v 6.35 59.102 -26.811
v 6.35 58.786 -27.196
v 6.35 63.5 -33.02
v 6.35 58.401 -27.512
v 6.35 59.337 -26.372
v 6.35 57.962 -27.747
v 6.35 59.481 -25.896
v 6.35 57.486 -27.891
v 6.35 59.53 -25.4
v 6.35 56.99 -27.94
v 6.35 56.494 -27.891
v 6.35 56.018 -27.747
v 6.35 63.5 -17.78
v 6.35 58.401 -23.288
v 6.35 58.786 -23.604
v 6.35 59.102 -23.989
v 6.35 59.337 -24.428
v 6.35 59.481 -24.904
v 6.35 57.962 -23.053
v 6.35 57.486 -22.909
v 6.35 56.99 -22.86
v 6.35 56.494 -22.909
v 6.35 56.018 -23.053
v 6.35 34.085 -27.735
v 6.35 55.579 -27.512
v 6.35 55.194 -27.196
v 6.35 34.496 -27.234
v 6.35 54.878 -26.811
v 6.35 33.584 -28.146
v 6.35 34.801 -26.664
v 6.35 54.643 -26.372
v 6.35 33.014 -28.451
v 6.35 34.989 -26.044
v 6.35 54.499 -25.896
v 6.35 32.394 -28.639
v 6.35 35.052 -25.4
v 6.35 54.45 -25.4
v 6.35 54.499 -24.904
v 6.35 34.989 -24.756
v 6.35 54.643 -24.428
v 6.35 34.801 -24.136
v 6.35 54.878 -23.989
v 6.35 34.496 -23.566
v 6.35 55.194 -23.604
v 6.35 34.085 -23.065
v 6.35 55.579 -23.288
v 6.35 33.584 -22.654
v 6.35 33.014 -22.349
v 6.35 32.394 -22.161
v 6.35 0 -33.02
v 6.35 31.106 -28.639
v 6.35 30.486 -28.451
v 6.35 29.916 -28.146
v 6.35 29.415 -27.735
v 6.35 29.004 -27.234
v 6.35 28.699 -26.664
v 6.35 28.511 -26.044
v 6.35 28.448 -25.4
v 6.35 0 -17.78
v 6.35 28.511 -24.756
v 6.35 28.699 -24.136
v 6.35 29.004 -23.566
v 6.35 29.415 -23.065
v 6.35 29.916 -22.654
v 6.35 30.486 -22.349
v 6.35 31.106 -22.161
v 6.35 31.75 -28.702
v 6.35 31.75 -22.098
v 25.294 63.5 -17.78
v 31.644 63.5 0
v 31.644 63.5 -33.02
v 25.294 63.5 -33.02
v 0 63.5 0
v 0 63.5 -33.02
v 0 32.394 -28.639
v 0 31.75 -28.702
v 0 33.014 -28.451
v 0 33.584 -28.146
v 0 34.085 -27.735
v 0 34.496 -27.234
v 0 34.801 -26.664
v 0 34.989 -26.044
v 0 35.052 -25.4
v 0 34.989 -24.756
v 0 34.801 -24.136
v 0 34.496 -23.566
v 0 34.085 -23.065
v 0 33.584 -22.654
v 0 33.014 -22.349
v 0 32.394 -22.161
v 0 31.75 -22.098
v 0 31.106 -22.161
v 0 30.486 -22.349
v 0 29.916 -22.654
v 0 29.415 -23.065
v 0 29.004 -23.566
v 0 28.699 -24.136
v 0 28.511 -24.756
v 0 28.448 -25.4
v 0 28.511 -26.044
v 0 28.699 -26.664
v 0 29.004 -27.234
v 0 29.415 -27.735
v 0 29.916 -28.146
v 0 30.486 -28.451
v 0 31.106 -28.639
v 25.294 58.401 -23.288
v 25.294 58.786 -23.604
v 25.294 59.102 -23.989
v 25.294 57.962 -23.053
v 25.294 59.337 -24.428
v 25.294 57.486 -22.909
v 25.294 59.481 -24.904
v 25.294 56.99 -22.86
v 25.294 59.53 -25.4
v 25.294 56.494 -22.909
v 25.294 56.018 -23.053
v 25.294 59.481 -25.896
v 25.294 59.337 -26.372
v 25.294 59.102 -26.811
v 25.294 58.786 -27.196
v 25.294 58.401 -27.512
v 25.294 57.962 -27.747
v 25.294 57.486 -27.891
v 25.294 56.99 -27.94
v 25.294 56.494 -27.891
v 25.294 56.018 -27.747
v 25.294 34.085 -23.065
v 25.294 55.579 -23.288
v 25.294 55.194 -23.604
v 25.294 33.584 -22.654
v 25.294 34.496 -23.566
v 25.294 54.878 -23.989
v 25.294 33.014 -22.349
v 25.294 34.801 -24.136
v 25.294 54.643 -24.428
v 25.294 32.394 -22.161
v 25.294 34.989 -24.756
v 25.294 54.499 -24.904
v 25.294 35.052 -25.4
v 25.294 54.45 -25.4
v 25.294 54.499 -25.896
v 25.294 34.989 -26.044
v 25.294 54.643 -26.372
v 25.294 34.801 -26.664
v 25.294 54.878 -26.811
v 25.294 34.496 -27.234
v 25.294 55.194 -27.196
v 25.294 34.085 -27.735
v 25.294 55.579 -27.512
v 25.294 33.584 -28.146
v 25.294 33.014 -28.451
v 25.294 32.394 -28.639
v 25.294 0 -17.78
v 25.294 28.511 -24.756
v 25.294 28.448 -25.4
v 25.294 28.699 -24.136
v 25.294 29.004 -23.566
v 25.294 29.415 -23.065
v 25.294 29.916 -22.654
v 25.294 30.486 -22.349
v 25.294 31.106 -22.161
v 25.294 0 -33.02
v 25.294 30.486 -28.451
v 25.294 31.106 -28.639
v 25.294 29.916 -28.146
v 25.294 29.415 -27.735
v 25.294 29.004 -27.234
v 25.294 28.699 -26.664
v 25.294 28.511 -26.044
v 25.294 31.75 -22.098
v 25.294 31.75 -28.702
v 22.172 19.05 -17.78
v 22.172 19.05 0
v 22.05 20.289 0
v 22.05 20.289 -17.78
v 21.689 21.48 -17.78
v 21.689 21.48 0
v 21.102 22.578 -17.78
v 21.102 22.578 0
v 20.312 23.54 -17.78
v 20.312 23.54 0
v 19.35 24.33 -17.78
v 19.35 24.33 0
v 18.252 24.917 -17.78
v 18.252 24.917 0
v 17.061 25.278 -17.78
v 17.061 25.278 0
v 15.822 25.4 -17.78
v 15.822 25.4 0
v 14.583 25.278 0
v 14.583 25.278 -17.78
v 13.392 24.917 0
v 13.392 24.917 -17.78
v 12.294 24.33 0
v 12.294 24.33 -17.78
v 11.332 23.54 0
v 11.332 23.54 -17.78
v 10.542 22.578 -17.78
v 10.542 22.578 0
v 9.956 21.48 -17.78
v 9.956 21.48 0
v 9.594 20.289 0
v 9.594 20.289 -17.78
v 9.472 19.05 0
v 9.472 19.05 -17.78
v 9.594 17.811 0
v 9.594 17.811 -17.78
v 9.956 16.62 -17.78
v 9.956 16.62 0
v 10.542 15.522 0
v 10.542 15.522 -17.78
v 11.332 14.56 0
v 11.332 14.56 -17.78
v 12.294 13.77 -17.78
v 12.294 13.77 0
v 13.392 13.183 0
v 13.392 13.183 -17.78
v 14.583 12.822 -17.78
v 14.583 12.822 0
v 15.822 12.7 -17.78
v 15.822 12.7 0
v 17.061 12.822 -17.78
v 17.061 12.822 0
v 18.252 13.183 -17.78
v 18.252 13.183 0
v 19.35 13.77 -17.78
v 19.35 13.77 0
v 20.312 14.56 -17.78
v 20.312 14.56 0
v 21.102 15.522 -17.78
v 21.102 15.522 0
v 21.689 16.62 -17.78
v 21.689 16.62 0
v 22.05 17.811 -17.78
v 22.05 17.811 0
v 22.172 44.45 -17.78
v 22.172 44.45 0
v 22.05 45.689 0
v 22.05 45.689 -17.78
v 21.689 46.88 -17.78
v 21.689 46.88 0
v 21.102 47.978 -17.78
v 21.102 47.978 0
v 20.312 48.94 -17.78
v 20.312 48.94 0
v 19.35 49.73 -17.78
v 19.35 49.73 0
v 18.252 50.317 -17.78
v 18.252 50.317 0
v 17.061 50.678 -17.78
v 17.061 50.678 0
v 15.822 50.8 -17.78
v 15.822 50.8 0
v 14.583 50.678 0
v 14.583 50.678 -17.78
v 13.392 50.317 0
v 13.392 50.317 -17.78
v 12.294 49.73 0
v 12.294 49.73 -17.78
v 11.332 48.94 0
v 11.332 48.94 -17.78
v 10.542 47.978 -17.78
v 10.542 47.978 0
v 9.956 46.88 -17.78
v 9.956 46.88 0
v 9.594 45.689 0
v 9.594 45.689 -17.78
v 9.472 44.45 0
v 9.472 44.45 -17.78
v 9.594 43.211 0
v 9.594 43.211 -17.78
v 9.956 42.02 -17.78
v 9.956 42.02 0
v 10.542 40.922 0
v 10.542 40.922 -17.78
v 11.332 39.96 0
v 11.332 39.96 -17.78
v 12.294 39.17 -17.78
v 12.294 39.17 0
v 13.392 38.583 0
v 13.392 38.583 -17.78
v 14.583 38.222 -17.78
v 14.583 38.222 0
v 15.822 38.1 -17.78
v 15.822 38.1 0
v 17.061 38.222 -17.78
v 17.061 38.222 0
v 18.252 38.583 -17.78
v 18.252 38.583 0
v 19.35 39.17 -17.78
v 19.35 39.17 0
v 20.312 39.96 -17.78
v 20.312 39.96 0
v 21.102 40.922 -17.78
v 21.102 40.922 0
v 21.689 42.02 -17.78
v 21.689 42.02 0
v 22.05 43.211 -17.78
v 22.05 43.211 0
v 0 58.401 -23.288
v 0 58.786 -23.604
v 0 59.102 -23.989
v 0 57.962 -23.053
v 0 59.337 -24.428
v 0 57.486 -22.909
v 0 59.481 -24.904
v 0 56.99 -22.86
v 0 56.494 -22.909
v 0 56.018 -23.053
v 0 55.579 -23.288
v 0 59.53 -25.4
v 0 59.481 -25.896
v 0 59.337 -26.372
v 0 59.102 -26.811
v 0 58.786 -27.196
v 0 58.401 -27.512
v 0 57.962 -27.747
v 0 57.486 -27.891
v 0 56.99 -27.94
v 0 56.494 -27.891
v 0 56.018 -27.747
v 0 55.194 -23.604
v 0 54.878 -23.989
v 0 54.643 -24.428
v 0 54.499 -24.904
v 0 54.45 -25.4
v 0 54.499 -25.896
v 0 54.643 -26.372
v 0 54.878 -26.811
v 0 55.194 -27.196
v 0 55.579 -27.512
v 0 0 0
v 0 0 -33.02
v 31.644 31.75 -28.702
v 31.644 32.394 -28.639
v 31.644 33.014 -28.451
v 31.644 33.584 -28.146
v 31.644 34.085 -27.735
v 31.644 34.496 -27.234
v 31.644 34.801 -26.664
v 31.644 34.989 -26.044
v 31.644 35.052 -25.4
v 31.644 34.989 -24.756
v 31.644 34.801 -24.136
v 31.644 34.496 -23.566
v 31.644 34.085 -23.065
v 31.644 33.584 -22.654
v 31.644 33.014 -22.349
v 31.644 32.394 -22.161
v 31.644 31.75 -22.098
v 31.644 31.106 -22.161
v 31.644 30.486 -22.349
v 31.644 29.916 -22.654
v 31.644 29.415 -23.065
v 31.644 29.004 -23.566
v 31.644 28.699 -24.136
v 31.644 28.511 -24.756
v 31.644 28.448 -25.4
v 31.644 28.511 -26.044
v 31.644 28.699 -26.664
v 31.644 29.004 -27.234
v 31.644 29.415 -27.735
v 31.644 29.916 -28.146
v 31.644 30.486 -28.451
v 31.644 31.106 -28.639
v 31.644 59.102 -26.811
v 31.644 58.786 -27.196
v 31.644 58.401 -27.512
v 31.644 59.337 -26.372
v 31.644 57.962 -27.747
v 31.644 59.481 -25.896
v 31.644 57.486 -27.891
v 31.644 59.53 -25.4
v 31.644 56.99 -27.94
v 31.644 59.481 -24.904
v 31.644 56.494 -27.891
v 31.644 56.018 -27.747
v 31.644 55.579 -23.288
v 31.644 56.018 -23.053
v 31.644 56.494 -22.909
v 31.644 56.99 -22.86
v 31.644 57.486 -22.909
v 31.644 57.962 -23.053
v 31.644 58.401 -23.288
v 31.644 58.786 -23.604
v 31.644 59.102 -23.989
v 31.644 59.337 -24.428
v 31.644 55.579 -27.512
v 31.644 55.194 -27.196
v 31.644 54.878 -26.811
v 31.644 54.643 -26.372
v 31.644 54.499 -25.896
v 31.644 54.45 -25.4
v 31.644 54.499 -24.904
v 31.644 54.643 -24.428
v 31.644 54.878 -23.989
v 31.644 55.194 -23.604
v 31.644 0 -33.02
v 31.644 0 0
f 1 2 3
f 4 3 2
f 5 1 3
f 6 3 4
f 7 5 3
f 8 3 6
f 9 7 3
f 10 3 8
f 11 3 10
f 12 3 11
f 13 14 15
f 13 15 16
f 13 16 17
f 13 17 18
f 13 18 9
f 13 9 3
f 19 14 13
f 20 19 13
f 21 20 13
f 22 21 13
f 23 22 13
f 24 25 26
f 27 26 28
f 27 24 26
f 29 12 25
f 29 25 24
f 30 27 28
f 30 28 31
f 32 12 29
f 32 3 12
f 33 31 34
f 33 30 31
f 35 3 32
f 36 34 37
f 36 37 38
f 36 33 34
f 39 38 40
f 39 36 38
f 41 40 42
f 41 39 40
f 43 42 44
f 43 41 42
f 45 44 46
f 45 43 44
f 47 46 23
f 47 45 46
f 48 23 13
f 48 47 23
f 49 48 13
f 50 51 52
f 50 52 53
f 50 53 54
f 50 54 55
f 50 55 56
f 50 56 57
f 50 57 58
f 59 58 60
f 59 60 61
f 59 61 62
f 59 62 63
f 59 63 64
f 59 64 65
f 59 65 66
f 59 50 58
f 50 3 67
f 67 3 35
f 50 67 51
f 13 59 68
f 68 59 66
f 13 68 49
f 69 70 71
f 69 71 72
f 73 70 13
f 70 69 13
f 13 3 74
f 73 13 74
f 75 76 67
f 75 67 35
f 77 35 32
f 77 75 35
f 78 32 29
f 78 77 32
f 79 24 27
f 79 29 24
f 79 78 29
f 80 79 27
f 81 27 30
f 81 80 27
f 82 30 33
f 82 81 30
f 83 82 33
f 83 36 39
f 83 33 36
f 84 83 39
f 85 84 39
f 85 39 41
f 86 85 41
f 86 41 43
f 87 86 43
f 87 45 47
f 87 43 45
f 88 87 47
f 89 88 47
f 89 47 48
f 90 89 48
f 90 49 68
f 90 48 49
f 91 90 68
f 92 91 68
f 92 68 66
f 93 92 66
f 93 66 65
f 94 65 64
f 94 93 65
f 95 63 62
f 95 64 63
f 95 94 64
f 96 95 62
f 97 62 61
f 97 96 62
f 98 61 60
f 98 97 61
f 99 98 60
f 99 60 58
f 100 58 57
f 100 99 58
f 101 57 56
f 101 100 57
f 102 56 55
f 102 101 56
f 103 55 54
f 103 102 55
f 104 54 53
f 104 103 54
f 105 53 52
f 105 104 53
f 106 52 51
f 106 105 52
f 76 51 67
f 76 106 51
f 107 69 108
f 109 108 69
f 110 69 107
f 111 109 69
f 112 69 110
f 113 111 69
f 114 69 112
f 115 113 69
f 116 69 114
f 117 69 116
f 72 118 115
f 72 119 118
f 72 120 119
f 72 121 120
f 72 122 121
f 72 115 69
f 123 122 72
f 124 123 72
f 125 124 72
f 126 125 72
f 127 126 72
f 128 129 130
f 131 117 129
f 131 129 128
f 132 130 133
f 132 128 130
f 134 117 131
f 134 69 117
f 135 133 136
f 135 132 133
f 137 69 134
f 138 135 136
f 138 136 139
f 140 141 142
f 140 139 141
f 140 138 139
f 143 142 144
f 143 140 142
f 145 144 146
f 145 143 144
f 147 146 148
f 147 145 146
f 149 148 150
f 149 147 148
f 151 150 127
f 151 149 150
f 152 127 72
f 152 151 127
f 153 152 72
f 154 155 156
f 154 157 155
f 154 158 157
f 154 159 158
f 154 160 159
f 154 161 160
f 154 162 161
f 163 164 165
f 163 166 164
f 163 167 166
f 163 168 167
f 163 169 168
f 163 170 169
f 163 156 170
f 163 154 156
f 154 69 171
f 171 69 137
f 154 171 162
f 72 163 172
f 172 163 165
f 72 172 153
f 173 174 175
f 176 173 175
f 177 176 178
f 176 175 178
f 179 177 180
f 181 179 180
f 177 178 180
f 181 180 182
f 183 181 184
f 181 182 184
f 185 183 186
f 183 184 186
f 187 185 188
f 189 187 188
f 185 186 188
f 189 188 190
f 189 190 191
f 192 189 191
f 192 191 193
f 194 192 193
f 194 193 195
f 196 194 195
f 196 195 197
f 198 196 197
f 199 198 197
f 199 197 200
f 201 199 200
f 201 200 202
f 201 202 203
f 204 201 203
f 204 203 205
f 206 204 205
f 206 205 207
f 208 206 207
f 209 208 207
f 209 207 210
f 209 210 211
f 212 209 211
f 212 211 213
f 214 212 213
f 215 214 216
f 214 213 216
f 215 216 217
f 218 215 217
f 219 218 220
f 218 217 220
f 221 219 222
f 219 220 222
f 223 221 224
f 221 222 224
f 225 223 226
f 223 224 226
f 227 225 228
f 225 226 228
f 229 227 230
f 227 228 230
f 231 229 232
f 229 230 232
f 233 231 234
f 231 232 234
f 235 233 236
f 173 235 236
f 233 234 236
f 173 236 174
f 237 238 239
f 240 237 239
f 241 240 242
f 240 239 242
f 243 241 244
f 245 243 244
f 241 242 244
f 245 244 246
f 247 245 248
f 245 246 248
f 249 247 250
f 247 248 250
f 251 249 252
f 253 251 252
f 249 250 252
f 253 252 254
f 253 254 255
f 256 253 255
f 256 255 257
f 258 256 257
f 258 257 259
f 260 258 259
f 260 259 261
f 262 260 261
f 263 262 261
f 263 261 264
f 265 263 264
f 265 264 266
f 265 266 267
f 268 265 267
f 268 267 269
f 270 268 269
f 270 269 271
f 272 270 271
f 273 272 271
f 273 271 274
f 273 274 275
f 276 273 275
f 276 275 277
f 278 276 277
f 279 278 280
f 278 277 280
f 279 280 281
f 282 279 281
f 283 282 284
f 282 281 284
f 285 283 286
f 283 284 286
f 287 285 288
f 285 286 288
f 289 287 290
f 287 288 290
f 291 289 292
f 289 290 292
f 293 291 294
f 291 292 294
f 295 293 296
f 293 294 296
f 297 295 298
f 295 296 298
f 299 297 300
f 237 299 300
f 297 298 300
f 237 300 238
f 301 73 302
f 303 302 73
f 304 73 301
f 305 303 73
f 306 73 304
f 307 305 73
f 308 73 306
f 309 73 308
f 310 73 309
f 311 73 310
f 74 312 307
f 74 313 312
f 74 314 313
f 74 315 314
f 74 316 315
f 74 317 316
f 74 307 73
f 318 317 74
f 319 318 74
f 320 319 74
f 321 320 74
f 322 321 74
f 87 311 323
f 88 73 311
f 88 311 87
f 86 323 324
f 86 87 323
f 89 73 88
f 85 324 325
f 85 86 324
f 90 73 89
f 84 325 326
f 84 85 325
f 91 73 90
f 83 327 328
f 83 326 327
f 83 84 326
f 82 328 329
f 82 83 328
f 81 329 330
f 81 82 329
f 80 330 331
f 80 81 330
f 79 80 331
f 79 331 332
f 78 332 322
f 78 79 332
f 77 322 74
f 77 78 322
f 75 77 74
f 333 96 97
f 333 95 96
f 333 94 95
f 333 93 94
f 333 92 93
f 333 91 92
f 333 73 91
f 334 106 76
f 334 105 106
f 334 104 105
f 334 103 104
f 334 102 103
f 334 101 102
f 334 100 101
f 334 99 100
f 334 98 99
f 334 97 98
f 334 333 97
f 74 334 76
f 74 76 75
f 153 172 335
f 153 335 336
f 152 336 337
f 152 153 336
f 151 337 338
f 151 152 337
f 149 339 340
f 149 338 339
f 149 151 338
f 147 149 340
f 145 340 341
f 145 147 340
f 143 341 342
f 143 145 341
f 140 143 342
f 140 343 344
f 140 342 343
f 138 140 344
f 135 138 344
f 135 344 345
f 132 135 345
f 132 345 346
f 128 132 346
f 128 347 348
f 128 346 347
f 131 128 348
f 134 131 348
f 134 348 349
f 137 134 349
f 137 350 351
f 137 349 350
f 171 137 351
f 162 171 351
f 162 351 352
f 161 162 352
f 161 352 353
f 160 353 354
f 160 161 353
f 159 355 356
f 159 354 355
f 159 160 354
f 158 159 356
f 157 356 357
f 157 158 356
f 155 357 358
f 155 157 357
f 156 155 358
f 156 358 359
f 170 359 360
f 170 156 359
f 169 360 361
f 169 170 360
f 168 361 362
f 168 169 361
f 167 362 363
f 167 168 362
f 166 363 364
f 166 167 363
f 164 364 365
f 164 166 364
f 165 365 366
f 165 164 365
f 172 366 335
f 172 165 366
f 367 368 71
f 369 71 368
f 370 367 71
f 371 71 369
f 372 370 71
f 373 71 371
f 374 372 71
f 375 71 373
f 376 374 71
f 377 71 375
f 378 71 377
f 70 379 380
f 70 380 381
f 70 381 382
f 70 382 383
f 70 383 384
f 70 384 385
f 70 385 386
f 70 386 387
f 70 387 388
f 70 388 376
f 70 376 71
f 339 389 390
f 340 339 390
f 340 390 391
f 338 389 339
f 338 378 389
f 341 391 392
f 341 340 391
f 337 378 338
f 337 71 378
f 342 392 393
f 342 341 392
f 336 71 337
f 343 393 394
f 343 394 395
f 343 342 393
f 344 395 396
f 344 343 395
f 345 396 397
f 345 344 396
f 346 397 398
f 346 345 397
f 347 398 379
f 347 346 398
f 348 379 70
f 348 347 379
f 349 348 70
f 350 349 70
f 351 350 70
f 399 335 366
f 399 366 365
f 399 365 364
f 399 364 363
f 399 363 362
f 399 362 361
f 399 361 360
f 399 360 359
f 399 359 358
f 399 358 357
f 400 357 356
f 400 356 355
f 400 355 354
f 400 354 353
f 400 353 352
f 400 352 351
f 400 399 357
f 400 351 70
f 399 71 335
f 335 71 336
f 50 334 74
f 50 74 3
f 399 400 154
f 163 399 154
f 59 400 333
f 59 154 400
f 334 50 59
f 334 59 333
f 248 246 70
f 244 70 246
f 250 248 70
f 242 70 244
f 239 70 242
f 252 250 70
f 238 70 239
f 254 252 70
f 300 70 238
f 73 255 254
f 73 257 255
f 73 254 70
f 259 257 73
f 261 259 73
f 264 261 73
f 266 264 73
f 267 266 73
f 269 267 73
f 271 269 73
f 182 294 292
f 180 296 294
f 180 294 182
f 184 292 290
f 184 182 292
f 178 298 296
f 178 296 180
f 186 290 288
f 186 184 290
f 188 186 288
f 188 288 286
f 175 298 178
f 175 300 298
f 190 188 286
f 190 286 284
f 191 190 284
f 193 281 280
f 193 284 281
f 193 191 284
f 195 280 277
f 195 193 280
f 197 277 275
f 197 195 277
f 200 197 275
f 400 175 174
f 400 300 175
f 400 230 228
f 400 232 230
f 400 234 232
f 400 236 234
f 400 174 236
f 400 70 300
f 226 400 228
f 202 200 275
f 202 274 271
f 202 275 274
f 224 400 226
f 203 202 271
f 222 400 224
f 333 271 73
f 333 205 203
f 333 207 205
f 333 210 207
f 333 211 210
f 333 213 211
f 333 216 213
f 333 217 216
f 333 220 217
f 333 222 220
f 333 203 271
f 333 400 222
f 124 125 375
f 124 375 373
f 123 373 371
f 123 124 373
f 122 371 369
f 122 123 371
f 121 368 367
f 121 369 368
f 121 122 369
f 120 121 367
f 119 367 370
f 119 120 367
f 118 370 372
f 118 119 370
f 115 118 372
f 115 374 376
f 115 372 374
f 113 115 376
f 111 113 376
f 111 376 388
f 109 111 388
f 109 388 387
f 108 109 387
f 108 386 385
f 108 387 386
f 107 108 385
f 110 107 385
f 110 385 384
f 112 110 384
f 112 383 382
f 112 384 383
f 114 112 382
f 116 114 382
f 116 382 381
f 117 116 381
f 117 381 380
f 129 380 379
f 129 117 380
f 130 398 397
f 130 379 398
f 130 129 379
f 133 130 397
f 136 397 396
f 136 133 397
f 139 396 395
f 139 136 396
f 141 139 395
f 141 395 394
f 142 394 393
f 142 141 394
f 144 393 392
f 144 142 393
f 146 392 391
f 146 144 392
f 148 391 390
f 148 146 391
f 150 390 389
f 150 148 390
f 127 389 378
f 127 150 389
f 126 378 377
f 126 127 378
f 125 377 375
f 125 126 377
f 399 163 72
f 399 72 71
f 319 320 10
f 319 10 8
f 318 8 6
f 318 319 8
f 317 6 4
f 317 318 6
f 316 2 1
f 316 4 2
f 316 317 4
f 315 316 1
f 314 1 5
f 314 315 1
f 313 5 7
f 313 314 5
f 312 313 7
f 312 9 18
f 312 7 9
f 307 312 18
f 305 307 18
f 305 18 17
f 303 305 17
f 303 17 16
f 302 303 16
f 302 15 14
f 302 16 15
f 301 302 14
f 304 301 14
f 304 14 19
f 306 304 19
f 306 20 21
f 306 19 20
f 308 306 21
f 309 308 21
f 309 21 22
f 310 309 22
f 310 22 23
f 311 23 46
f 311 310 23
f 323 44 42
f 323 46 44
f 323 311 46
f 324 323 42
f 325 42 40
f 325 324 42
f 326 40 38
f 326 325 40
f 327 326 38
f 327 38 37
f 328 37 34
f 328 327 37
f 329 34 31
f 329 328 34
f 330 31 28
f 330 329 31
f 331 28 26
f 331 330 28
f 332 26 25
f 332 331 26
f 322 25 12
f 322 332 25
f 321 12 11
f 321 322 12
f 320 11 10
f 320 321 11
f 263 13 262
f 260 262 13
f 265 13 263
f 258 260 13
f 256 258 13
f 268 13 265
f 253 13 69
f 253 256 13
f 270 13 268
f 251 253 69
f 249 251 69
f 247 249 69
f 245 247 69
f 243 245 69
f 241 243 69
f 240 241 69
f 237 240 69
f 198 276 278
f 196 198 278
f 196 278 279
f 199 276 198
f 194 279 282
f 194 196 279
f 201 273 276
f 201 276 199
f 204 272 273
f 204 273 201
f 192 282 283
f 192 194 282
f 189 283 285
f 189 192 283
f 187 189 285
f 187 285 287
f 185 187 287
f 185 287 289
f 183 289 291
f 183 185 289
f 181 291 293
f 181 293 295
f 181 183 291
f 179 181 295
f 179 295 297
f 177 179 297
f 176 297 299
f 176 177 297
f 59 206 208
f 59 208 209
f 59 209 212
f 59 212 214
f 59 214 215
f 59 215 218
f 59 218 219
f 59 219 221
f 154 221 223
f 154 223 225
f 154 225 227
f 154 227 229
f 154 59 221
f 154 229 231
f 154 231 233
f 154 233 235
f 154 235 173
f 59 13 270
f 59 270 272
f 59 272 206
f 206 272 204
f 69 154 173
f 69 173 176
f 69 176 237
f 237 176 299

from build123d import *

# Parameters (mm, degrees)
BOSS_EXTRUDE1_DEPTH     = 63.5
SKETCH2_R               = 6.35
CUT_EXTRUDE1_DEPTH      = 79.25560529
CUT_EXTRUDE2_DEPTH      = 76.910329448
CUT_EXTRUDE2_DEPTH_BACK = 76.910329448
SKETCH5_R               = 3.302
SKETCH5_R_2             = 2.54


with BuildPart() as part:
    # Sketch1 → Boss-Extrude1 (new body)
    with BuildSketch(Plane(origin=(0, 0, 0), x_dir=(1, 0, 0), z_dir=(0, 1, 0))):
        Polygon((0, 0), (0, 33.02), (6.35, 33.02), (6.35, 17.78), (25.294420667, 17.78), (25.294420667, 33.02), (31.644420667, 33.02), (31.644420667, 0), align=None)
    extrude(amount=BOSS_EXTRUDE1_DEPTH)

    # Sketch2 → Cut-Extrude1 (cut, through all)
    with BuildSketch(Plane.XY):
        with Locations((15.822210333, 44.45)):
            Circle(SKETCH2_R)
        with Locations((15.822210333, 19.05)):
            Circle(SKETCH2_R)
    extrude(amount=-CUT_EXTRUDE1_DEPTH, mode=Mode.SUBTRACT)

    # Sketch5 → Cut-Extrude2 (cut, two sides: drawn at the far end of the back side and taken through both)
    with BuildSketch(Plane(origin=(6.35, 0, 0), x_dir=(0, 0, -1), z_dir=(1, 0, 0)).offset(-CUT_EXTRUDE2_DEPTH_BACK)):
        with Locations((25.4, 31.75)):
            Circle(SKETCH5_R)
        with Locations((25.4, 56.989992478)):
            Circle(SKETCH5_R_2)
    extrude(amount=CUT_EXTRUDE2_DEPTH + CUT_EXTRUDE2_DEPTH_BACK, mode=Mode.SUBTRACT)


solid = part.part
